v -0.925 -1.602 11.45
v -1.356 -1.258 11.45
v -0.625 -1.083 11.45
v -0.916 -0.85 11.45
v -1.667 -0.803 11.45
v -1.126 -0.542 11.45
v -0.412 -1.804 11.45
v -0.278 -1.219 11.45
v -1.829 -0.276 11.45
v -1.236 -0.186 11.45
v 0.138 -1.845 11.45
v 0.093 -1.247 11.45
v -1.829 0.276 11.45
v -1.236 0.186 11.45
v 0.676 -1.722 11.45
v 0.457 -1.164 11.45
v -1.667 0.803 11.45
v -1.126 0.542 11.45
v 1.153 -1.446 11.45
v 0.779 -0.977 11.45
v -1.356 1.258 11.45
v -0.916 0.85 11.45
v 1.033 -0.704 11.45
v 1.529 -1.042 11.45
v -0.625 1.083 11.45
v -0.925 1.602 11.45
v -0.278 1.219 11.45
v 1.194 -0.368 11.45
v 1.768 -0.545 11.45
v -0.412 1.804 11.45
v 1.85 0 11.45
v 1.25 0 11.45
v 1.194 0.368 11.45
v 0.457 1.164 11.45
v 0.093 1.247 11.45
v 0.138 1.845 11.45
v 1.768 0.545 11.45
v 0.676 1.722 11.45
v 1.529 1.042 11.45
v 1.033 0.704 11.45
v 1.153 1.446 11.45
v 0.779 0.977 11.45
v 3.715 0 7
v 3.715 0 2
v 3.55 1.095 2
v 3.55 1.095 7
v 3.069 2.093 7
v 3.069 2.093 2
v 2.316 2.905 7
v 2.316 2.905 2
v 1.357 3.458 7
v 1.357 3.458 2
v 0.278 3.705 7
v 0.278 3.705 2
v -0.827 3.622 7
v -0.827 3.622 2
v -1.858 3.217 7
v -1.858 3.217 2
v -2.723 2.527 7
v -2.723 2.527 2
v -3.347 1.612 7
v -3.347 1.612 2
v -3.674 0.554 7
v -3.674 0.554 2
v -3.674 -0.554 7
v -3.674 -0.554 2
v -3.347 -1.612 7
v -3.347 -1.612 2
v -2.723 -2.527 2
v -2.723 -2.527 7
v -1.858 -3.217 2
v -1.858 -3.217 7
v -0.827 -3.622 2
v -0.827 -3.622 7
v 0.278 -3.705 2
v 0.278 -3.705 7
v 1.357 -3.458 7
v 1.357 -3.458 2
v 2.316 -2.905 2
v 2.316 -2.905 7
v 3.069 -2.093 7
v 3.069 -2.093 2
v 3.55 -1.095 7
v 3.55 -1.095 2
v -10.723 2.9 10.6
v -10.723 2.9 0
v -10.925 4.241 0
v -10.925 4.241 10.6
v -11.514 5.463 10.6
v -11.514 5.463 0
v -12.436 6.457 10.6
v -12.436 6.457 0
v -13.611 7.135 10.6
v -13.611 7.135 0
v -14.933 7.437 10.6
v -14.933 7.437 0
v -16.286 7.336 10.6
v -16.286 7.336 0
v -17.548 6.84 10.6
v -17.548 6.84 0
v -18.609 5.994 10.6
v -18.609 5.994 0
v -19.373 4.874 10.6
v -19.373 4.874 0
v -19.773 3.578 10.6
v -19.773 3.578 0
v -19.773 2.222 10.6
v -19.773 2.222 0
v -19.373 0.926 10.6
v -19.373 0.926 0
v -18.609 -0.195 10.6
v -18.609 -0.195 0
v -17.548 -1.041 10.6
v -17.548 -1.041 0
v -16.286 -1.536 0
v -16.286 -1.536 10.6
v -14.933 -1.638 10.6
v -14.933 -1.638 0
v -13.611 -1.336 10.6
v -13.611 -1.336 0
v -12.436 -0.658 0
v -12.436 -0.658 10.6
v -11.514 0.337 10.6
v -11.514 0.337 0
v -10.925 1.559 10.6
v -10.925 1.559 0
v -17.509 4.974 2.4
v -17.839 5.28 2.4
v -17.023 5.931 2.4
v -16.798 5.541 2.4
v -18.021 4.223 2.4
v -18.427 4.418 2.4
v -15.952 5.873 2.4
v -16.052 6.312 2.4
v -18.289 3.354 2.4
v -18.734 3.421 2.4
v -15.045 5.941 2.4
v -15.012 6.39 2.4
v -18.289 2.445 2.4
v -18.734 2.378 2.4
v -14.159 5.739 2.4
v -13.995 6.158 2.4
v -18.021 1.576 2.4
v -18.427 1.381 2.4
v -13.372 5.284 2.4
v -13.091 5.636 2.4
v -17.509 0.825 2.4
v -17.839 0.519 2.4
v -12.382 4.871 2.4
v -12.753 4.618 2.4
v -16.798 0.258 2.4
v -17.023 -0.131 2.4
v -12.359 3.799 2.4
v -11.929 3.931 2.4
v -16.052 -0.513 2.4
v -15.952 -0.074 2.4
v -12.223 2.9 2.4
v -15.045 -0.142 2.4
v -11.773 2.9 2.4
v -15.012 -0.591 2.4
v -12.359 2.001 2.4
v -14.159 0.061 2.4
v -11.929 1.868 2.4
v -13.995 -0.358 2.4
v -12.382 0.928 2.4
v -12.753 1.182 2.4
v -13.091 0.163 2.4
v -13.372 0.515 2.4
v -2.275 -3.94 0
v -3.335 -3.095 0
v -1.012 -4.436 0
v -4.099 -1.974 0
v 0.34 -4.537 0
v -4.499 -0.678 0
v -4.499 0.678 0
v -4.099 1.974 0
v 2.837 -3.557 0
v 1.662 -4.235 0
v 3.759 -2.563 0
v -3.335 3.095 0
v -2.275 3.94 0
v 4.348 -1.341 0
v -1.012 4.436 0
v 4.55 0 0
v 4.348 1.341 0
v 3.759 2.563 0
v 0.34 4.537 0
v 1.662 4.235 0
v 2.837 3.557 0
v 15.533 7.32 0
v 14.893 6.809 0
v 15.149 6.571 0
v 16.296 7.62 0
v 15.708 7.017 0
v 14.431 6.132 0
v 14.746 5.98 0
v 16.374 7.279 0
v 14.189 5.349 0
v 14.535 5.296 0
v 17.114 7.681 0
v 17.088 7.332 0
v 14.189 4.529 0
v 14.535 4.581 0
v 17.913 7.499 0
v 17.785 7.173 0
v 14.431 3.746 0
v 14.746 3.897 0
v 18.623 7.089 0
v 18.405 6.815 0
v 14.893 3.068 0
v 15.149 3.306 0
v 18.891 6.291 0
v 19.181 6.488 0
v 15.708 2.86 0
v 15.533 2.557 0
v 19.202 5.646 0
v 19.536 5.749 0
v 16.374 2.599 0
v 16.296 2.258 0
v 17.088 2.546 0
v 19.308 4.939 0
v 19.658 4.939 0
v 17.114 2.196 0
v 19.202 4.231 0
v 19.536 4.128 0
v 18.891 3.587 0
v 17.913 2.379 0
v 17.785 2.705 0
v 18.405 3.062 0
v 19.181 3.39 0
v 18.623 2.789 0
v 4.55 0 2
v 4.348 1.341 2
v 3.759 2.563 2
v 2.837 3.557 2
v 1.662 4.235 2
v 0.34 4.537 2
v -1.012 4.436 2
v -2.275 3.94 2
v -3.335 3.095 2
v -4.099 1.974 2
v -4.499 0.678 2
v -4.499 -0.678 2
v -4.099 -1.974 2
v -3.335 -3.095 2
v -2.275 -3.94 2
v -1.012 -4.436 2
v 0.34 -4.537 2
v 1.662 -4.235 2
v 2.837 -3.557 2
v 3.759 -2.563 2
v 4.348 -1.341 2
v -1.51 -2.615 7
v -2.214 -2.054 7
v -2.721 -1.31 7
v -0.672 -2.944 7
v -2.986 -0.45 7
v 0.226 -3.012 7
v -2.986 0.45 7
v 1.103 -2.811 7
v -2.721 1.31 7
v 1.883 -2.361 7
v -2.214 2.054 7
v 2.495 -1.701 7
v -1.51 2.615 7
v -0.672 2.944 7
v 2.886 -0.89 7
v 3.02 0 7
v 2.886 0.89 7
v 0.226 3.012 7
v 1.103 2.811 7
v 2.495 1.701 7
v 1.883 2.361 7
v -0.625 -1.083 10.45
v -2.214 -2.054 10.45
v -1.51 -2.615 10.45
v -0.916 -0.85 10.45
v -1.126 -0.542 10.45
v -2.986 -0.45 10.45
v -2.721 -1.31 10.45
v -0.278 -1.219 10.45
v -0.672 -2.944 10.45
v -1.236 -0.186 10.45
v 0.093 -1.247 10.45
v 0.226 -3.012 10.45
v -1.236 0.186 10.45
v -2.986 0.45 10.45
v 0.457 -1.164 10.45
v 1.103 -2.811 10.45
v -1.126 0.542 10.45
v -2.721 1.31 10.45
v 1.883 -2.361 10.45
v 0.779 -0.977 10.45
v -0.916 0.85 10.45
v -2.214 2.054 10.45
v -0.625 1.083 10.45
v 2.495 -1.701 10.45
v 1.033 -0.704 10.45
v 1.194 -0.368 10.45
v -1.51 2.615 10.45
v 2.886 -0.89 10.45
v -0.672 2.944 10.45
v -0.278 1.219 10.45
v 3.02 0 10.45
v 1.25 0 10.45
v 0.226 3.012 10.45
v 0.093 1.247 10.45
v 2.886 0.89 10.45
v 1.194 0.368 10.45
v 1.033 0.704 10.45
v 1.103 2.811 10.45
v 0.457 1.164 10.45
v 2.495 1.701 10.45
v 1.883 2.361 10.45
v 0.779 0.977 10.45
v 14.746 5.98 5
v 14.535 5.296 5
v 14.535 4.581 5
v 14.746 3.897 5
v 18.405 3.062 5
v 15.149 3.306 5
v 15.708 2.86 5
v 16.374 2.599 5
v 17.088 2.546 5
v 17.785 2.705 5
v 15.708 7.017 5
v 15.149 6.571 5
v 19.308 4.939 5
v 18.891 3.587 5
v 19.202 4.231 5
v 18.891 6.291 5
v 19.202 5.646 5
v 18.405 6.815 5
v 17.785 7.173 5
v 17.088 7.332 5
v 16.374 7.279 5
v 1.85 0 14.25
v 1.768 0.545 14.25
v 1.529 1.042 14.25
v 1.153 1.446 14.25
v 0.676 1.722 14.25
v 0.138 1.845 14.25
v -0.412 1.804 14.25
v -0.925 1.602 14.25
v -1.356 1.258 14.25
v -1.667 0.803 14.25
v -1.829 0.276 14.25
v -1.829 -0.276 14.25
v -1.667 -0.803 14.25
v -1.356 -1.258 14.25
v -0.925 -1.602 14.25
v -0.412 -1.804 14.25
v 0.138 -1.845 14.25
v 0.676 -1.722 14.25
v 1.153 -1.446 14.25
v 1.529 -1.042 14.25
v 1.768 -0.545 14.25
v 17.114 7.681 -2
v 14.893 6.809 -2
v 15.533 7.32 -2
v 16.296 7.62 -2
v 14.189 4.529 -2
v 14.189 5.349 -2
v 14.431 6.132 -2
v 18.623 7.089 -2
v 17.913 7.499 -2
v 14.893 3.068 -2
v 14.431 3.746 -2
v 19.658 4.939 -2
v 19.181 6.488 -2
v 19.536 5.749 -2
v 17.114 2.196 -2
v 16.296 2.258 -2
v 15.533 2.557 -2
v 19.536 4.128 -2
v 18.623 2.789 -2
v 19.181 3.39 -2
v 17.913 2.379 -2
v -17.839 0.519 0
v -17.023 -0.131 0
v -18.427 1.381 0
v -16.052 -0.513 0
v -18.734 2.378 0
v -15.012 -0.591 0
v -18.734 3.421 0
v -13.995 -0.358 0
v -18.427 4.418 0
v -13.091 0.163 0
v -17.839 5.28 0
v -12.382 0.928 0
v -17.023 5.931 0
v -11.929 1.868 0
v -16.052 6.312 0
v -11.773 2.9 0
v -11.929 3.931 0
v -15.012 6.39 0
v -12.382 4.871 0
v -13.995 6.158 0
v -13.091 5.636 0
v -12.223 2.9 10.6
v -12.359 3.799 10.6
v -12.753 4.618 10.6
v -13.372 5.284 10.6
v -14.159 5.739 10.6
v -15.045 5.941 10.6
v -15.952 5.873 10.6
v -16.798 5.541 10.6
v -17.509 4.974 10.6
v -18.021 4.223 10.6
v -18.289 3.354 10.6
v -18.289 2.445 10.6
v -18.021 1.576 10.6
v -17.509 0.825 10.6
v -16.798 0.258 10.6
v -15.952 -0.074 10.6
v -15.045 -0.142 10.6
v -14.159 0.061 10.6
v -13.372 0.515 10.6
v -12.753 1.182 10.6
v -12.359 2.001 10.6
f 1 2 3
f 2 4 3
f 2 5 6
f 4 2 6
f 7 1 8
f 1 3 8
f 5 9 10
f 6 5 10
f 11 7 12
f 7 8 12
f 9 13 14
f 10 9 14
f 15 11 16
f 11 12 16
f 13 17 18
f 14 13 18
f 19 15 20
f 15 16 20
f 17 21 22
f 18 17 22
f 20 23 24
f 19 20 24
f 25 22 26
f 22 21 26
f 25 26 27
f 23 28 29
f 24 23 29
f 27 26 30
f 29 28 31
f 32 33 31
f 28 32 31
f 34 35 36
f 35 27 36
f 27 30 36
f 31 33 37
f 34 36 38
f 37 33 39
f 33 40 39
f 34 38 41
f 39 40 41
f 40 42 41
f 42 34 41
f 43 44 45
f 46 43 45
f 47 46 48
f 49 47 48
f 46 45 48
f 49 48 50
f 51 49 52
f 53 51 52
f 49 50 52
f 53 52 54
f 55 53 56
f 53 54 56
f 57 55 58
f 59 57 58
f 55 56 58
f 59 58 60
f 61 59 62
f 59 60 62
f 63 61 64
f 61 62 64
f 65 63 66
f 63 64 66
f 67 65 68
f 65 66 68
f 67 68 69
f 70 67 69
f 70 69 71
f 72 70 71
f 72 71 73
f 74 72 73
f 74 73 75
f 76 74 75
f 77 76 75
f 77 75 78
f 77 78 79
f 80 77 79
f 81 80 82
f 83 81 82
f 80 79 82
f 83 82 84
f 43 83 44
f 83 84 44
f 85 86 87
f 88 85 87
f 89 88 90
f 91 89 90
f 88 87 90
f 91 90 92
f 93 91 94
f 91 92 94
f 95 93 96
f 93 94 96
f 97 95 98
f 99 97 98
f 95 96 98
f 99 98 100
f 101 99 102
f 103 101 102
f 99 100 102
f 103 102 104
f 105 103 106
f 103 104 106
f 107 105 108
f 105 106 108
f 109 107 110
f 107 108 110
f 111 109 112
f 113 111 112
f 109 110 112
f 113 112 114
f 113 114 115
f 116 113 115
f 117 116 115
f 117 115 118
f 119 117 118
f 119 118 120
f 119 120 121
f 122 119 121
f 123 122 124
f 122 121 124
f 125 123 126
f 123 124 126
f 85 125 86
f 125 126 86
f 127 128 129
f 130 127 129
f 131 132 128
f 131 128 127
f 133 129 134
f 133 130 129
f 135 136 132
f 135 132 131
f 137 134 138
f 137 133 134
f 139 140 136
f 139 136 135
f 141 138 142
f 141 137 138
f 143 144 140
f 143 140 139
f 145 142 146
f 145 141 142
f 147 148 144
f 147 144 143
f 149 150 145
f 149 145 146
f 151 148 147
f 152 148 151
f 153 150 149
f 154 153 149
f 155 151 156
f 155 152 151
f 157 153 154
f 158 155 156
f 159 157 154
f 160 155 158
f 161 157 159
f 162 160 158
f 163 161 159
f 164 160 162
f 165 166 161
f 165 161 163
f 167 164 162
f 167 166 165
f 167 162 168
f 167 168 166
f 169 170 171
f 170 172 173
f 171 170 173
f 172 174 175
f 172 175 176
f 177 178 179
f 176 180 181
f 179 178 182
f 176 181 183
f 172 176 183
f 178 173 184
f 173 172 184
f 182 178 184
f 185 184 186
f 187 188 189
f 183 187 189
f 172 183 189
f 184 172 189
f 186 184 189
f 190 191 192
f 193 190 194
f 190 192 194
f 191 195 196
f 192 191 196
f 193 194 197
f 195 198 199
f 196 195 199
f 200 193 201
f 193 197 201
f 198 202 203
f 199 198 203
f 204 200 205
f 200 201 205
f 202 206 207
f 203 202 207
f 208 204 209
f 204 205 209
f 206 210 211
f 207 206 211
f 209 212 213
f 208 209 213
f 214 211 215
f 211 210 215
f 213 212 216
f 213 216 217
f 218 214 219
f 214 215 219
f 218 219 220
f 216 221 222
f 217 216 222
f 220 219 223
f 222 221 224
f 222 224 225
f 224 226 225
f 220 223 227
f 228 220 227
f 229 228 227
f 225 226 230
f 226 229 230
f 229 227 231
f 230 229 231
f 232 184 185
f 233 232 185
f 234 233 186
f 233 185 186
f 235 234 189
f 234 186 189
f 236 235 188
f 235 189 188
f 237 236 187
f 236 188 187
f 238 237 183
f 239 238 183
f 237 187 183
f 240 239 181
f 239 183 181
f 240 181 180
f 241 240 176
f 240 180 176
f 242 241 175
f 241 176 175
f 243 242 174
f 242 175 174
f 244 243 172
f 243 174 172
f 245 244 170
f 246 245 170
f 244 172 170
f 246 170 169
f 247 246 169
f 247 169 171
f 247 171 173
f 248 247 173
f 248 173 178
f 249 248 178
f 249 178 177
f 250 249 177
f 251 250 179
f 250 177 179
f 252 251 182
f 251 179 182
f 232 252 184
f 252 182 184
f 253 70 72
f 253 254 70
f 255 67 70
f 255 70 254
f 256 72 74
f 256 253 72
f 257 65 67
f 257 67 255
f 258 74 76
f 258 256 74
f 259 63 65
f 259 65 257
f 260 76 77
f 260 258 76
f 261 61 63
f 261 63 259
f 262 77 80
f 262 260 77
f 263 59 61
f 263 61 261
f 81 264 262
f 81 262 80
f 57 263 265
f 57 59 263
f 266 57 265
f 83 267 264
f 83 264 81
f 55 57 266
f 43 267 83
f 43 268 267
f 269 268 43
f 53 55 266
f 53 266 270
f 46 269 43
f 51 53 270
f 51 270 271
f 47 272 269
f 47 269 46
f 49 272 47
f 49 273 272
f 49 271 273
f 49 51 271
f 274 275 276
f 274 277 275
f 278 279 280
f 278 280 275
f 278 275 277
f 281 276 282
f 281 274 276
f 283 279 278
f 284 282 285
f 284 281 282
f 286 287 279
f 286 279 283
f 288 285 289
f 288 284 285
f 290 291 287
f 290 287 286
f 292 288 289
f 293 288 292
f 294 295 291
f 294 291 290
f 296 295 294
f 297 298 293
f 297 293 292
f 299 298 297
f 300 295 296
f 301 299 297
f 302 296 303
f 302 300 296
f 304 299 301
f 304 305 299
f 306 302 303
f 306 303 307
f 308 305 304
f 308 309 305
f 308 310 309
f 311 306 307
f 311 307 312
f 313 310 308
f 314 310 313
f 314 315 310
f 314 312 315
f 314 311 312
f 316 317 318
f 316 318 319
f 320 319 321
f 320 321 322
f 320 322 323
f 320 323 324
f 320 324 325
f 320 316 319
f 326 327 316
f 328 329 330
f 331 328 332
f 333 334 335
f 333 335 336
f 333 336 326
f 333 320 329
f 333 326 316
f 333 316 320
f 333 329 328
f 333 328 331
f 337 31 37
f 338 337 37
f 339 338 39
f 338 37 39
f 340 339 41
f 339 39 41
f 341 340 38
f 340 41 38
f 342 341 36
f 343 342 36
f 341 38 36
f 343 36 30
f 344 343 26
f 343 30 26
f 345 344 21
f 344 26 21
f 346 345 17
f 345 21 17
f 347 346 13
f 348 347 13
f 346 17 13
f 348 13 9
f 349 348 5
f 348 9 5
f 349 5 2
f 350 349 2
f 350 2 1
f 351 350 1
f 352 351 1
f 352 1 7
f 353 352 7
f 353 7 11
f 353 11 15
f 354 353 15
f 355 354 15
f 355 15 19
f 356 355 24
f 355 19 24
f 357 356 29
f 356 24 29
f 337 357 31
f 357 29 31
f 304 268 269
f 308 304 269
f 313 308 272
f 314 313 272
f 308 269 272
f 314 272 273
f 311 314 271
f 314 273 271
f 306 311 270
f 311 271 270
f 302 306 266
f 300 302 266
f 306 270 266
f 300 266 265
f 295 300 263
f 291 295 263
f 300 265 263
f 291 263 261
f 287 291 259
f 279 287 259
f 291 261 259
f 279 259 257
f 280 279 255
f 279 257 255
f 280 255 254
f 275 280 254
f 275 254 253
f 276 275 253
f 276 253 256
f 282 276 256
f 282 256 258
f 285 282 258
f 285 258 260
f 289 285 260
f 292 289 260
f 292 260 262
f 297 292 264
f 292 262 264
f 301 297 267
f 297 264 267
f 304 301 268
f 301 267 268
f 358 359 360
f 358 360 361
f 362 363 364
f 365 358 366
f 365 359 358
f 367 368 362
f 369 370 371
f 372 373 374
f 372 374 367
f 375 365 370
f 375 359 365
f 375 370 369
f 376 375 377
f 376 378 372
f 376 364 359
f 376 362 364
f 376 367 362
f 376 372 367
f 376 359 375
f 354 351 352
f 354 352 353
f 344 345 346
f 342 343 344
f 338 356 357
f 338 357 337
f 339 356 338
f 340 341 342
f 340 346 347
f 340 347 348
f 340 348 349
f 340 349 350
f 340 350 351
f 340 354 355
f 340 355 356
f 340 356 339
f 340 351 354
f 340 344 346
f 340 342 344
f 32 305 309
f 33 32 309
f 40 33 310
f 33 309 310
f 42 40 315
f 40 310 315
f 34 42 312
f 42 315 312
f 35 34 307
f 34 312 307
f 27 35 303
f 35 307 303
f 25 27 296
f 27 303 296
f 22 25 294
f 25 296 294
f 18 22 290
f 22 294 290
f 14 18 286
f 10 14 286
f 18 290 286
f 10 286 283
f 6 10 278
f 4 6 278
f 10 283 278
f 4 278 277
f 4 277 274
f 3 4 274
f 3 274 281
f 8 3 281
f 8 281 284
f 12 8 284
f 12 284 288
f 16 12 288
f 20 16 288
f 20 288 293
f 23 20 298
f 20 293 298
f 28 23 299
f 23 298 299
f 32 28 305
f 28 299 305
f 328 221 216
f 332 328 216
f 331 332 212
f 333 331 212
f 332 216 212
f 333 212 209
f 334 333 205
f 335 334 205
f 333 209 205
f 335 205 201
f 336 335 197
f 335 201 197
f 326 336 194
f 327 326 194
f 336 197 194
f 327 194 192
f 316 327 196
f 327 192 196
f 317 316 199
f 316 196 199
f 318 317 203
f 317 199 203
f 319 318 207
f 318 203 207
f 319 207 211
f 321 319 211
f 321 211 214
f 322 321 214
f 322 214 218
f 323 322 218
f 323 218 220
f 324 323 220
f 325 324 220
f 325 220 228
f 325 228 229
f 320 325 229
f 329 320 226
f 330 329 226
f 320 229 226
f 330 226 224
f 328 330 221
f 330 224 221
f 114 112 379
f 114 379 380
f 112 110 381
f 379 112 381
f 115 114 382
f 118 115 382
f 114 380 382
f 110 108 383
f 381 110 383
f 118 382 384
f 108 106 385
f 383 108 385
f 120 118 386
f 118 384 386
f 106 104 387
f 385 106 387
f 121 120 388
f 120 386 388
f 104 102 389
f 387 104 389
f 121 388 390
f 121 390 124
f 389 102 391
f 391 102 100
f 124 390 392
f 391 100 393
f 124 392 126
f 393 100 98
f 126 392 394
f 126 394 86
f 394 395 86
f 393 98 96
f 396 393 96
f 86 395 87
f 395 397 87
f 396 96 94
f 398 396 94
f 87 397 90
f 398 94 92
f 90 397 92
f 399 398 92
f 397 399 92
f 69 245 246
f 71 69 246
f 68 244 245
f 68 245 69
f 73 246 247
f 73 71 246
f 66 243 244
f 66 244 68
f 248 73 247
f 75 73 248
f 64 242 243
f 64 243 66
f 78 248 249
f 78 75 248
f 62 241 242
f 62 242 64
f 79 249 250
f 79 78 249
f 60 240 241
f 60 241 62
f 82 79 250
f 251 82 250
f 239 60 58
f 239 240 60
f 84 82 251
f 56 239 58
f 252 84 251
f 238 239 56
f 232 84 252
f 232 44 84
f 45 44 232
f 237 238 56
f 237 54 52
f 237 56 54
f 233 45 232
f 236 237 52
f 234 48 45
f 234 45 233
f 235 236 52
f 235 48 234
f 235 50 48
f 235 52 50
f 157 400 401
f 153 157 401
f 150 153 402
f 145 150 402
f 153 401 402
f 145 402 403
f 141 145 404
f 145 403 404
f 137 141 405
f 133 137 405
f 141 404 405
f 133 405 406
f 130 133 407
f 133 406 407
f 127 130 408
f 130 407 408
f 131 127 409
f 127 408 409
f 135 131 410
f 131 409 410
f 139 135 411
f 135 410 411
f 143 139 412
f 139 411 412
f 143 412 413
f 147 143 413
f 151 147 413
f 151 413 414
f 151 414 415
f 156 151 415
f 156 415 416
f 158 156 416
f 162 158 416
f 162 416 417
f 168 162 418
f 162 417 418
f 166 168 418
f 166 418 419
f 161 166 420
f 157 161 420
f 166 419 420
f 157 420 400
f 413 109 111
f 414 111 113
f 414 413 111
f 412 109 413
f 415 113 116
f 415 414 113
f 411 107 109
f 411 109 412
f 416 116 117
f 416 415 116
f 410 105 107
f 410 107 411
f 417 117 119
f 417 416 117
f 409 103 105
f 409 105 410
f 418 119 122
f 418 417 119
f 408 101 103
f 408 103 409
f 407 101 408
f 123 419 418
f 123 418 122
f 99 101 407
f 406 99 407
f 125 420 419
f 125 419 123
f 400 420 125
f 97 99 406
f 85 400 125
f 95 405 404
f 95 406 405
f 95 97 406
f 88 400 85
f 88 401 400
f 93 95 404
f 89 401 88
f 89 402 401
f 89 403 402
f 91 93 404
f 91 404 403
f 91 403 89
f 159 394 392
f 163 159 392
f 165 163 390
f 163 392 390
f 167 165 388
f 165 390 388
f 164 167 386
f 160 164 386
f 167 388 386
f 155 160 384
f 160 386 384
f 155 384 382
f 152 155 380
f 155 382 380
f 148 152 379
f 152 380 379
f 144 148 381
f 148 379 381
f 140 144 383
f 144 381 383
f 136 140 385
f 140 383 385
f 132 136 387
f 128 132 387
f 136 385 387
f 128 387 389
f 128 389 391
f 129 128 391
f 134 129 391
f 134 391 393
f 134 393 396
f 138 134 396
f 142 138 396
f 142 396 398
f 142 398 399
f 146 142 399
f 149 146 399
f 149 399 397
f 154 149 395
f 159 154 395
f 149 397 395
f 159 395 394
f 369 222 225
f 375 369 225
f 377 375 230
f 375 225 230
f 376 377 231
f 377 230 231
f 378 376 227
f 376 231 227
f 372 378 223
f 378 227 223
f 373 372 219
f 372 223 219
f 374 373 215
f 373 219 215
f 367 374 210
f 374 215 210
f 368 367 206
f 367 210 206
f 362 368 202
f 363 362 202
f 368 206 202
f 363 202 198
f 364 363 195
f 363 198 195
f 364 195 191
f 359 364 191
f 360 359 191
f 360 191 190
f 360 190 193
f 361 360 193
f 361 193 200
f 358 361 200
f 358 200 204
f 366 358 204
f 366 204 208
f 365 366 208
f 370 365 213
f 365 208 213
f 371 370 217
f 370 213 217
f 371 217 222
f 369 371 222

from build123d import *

# Parameters (mm, degrees)
F0_R      = 4.55
F2_DEPTH  = 2
F3_R      = 3.715
F4_DEPTH  = 5
F5_R      = 3.02
F6_DEPTH  = 3.45
F7_R      = 1.25
F8_DEPTH  = 1
F9_R      = 1.85
F9_R_2    = 1.25
F10_DEPTH = 2.8
F1_R      = 4.55
F11_DEPTH = 10.6
F12_R     = 3.05
F13_DEPTH = 8.2
F14_R     = 3.5
F15_DEPTH = 2.4
F16_R     = 2.4
F17_DEPTH = 5
F18_R     = 2.75
F18_R_2   = 2.4
F19_DEPTH = 2


with BuildPart() as f2:
    # F0 (on Top) → F2 (new body)
    with BuildSketch(Plane.XY):
        Circle(F0_R)
    extrude(amount=F2_DEPTH)

    # F3 (on face) → F4 (join)
    with BuildSketch(Plane.XY.offset(2)):
        Circle(F3_R)
    extrude(amount=F4_DEPTH)

    # F5 (on face) → F6 (join)
    with BuildSketch(Plane.XY.offset(7)):
        Circle(F5_R)
    extrude(amount=F6_DEPTH)

    # F7 (on face) → F8 (join)
    with BuildSketch(Plane.XY.offset(10.45)):
        Circle(F7_R)
    extrude(amount=F8_DEPTH)

    # F9 (on face) → F10 (join)
    with BuildSketch(Plane.XY.offset(11.45)):
        Circle(F9_R)
        Circle(F9_R_2, mode=Mode.SUBTRACT)
        Circle(F9_R_2)
    extrude(amount=F10_DEPTH)


with BuildPart() as f11:
    # F1 (on Top) → F11 (new body)
    with BuildSketch(Plane.XY):
        with Locations((-15.2733437717, 2.8996735346)):
            Circle(F1_R)
    extrude(amount=F11_DEPTH)

    # F12 (on face) → F13 (cut)
    with BuildSketch(Plane.XY.offset(10.6)):
        with Locations((-15.2733437717, 2.8996735346)):
            Circle(F12_R)
    extrude(amount=-F13_DEPTH, mode=Mode.SUBTRACT)

    # F14 (on face) → F15 (cut)
    with BuildSketch(Plane(origin=(0, 0, 0), x_dir=(1, 0, 0), z_dir=(0, 0, -1))):
        with Locations((-15.2733437717, -2.8996735346)):
            Circle(F14_R)
    extrude(amount=-F15_DEPTH, mode=Mode.SUBTRACT)


with BuildPart() as f17:
    # F16 (on Top) → F17 (new body)
    with BuildSketch(Plane.XY):
        with Locations((16.9084314257, 4.9387966283)):
            Circle(F16_R)
    extrude(amount=F17_DEPTH)

    # F18 (on face) → F19 (join)
    with BuildSketch(Plane(origin=(0, 0, 0), x_dir=(1, 0, 0), z_dir=(0, 0, -1))):
        with Locations((16.9084314257, -4.9387966283)):
            Circle(F18_R)
        with Locations((16.9084314257, -4.9387966283)):
            Circle(F18_R_2, mode=Mode.SUBTRACT)
        with Locations((16.9084314257, -4.9387966283)):
            Circle(F18_R_2)
    extrude(amount=F19_DEPTH)


solid = Compound([f2.part, f11.part, f17.part])
